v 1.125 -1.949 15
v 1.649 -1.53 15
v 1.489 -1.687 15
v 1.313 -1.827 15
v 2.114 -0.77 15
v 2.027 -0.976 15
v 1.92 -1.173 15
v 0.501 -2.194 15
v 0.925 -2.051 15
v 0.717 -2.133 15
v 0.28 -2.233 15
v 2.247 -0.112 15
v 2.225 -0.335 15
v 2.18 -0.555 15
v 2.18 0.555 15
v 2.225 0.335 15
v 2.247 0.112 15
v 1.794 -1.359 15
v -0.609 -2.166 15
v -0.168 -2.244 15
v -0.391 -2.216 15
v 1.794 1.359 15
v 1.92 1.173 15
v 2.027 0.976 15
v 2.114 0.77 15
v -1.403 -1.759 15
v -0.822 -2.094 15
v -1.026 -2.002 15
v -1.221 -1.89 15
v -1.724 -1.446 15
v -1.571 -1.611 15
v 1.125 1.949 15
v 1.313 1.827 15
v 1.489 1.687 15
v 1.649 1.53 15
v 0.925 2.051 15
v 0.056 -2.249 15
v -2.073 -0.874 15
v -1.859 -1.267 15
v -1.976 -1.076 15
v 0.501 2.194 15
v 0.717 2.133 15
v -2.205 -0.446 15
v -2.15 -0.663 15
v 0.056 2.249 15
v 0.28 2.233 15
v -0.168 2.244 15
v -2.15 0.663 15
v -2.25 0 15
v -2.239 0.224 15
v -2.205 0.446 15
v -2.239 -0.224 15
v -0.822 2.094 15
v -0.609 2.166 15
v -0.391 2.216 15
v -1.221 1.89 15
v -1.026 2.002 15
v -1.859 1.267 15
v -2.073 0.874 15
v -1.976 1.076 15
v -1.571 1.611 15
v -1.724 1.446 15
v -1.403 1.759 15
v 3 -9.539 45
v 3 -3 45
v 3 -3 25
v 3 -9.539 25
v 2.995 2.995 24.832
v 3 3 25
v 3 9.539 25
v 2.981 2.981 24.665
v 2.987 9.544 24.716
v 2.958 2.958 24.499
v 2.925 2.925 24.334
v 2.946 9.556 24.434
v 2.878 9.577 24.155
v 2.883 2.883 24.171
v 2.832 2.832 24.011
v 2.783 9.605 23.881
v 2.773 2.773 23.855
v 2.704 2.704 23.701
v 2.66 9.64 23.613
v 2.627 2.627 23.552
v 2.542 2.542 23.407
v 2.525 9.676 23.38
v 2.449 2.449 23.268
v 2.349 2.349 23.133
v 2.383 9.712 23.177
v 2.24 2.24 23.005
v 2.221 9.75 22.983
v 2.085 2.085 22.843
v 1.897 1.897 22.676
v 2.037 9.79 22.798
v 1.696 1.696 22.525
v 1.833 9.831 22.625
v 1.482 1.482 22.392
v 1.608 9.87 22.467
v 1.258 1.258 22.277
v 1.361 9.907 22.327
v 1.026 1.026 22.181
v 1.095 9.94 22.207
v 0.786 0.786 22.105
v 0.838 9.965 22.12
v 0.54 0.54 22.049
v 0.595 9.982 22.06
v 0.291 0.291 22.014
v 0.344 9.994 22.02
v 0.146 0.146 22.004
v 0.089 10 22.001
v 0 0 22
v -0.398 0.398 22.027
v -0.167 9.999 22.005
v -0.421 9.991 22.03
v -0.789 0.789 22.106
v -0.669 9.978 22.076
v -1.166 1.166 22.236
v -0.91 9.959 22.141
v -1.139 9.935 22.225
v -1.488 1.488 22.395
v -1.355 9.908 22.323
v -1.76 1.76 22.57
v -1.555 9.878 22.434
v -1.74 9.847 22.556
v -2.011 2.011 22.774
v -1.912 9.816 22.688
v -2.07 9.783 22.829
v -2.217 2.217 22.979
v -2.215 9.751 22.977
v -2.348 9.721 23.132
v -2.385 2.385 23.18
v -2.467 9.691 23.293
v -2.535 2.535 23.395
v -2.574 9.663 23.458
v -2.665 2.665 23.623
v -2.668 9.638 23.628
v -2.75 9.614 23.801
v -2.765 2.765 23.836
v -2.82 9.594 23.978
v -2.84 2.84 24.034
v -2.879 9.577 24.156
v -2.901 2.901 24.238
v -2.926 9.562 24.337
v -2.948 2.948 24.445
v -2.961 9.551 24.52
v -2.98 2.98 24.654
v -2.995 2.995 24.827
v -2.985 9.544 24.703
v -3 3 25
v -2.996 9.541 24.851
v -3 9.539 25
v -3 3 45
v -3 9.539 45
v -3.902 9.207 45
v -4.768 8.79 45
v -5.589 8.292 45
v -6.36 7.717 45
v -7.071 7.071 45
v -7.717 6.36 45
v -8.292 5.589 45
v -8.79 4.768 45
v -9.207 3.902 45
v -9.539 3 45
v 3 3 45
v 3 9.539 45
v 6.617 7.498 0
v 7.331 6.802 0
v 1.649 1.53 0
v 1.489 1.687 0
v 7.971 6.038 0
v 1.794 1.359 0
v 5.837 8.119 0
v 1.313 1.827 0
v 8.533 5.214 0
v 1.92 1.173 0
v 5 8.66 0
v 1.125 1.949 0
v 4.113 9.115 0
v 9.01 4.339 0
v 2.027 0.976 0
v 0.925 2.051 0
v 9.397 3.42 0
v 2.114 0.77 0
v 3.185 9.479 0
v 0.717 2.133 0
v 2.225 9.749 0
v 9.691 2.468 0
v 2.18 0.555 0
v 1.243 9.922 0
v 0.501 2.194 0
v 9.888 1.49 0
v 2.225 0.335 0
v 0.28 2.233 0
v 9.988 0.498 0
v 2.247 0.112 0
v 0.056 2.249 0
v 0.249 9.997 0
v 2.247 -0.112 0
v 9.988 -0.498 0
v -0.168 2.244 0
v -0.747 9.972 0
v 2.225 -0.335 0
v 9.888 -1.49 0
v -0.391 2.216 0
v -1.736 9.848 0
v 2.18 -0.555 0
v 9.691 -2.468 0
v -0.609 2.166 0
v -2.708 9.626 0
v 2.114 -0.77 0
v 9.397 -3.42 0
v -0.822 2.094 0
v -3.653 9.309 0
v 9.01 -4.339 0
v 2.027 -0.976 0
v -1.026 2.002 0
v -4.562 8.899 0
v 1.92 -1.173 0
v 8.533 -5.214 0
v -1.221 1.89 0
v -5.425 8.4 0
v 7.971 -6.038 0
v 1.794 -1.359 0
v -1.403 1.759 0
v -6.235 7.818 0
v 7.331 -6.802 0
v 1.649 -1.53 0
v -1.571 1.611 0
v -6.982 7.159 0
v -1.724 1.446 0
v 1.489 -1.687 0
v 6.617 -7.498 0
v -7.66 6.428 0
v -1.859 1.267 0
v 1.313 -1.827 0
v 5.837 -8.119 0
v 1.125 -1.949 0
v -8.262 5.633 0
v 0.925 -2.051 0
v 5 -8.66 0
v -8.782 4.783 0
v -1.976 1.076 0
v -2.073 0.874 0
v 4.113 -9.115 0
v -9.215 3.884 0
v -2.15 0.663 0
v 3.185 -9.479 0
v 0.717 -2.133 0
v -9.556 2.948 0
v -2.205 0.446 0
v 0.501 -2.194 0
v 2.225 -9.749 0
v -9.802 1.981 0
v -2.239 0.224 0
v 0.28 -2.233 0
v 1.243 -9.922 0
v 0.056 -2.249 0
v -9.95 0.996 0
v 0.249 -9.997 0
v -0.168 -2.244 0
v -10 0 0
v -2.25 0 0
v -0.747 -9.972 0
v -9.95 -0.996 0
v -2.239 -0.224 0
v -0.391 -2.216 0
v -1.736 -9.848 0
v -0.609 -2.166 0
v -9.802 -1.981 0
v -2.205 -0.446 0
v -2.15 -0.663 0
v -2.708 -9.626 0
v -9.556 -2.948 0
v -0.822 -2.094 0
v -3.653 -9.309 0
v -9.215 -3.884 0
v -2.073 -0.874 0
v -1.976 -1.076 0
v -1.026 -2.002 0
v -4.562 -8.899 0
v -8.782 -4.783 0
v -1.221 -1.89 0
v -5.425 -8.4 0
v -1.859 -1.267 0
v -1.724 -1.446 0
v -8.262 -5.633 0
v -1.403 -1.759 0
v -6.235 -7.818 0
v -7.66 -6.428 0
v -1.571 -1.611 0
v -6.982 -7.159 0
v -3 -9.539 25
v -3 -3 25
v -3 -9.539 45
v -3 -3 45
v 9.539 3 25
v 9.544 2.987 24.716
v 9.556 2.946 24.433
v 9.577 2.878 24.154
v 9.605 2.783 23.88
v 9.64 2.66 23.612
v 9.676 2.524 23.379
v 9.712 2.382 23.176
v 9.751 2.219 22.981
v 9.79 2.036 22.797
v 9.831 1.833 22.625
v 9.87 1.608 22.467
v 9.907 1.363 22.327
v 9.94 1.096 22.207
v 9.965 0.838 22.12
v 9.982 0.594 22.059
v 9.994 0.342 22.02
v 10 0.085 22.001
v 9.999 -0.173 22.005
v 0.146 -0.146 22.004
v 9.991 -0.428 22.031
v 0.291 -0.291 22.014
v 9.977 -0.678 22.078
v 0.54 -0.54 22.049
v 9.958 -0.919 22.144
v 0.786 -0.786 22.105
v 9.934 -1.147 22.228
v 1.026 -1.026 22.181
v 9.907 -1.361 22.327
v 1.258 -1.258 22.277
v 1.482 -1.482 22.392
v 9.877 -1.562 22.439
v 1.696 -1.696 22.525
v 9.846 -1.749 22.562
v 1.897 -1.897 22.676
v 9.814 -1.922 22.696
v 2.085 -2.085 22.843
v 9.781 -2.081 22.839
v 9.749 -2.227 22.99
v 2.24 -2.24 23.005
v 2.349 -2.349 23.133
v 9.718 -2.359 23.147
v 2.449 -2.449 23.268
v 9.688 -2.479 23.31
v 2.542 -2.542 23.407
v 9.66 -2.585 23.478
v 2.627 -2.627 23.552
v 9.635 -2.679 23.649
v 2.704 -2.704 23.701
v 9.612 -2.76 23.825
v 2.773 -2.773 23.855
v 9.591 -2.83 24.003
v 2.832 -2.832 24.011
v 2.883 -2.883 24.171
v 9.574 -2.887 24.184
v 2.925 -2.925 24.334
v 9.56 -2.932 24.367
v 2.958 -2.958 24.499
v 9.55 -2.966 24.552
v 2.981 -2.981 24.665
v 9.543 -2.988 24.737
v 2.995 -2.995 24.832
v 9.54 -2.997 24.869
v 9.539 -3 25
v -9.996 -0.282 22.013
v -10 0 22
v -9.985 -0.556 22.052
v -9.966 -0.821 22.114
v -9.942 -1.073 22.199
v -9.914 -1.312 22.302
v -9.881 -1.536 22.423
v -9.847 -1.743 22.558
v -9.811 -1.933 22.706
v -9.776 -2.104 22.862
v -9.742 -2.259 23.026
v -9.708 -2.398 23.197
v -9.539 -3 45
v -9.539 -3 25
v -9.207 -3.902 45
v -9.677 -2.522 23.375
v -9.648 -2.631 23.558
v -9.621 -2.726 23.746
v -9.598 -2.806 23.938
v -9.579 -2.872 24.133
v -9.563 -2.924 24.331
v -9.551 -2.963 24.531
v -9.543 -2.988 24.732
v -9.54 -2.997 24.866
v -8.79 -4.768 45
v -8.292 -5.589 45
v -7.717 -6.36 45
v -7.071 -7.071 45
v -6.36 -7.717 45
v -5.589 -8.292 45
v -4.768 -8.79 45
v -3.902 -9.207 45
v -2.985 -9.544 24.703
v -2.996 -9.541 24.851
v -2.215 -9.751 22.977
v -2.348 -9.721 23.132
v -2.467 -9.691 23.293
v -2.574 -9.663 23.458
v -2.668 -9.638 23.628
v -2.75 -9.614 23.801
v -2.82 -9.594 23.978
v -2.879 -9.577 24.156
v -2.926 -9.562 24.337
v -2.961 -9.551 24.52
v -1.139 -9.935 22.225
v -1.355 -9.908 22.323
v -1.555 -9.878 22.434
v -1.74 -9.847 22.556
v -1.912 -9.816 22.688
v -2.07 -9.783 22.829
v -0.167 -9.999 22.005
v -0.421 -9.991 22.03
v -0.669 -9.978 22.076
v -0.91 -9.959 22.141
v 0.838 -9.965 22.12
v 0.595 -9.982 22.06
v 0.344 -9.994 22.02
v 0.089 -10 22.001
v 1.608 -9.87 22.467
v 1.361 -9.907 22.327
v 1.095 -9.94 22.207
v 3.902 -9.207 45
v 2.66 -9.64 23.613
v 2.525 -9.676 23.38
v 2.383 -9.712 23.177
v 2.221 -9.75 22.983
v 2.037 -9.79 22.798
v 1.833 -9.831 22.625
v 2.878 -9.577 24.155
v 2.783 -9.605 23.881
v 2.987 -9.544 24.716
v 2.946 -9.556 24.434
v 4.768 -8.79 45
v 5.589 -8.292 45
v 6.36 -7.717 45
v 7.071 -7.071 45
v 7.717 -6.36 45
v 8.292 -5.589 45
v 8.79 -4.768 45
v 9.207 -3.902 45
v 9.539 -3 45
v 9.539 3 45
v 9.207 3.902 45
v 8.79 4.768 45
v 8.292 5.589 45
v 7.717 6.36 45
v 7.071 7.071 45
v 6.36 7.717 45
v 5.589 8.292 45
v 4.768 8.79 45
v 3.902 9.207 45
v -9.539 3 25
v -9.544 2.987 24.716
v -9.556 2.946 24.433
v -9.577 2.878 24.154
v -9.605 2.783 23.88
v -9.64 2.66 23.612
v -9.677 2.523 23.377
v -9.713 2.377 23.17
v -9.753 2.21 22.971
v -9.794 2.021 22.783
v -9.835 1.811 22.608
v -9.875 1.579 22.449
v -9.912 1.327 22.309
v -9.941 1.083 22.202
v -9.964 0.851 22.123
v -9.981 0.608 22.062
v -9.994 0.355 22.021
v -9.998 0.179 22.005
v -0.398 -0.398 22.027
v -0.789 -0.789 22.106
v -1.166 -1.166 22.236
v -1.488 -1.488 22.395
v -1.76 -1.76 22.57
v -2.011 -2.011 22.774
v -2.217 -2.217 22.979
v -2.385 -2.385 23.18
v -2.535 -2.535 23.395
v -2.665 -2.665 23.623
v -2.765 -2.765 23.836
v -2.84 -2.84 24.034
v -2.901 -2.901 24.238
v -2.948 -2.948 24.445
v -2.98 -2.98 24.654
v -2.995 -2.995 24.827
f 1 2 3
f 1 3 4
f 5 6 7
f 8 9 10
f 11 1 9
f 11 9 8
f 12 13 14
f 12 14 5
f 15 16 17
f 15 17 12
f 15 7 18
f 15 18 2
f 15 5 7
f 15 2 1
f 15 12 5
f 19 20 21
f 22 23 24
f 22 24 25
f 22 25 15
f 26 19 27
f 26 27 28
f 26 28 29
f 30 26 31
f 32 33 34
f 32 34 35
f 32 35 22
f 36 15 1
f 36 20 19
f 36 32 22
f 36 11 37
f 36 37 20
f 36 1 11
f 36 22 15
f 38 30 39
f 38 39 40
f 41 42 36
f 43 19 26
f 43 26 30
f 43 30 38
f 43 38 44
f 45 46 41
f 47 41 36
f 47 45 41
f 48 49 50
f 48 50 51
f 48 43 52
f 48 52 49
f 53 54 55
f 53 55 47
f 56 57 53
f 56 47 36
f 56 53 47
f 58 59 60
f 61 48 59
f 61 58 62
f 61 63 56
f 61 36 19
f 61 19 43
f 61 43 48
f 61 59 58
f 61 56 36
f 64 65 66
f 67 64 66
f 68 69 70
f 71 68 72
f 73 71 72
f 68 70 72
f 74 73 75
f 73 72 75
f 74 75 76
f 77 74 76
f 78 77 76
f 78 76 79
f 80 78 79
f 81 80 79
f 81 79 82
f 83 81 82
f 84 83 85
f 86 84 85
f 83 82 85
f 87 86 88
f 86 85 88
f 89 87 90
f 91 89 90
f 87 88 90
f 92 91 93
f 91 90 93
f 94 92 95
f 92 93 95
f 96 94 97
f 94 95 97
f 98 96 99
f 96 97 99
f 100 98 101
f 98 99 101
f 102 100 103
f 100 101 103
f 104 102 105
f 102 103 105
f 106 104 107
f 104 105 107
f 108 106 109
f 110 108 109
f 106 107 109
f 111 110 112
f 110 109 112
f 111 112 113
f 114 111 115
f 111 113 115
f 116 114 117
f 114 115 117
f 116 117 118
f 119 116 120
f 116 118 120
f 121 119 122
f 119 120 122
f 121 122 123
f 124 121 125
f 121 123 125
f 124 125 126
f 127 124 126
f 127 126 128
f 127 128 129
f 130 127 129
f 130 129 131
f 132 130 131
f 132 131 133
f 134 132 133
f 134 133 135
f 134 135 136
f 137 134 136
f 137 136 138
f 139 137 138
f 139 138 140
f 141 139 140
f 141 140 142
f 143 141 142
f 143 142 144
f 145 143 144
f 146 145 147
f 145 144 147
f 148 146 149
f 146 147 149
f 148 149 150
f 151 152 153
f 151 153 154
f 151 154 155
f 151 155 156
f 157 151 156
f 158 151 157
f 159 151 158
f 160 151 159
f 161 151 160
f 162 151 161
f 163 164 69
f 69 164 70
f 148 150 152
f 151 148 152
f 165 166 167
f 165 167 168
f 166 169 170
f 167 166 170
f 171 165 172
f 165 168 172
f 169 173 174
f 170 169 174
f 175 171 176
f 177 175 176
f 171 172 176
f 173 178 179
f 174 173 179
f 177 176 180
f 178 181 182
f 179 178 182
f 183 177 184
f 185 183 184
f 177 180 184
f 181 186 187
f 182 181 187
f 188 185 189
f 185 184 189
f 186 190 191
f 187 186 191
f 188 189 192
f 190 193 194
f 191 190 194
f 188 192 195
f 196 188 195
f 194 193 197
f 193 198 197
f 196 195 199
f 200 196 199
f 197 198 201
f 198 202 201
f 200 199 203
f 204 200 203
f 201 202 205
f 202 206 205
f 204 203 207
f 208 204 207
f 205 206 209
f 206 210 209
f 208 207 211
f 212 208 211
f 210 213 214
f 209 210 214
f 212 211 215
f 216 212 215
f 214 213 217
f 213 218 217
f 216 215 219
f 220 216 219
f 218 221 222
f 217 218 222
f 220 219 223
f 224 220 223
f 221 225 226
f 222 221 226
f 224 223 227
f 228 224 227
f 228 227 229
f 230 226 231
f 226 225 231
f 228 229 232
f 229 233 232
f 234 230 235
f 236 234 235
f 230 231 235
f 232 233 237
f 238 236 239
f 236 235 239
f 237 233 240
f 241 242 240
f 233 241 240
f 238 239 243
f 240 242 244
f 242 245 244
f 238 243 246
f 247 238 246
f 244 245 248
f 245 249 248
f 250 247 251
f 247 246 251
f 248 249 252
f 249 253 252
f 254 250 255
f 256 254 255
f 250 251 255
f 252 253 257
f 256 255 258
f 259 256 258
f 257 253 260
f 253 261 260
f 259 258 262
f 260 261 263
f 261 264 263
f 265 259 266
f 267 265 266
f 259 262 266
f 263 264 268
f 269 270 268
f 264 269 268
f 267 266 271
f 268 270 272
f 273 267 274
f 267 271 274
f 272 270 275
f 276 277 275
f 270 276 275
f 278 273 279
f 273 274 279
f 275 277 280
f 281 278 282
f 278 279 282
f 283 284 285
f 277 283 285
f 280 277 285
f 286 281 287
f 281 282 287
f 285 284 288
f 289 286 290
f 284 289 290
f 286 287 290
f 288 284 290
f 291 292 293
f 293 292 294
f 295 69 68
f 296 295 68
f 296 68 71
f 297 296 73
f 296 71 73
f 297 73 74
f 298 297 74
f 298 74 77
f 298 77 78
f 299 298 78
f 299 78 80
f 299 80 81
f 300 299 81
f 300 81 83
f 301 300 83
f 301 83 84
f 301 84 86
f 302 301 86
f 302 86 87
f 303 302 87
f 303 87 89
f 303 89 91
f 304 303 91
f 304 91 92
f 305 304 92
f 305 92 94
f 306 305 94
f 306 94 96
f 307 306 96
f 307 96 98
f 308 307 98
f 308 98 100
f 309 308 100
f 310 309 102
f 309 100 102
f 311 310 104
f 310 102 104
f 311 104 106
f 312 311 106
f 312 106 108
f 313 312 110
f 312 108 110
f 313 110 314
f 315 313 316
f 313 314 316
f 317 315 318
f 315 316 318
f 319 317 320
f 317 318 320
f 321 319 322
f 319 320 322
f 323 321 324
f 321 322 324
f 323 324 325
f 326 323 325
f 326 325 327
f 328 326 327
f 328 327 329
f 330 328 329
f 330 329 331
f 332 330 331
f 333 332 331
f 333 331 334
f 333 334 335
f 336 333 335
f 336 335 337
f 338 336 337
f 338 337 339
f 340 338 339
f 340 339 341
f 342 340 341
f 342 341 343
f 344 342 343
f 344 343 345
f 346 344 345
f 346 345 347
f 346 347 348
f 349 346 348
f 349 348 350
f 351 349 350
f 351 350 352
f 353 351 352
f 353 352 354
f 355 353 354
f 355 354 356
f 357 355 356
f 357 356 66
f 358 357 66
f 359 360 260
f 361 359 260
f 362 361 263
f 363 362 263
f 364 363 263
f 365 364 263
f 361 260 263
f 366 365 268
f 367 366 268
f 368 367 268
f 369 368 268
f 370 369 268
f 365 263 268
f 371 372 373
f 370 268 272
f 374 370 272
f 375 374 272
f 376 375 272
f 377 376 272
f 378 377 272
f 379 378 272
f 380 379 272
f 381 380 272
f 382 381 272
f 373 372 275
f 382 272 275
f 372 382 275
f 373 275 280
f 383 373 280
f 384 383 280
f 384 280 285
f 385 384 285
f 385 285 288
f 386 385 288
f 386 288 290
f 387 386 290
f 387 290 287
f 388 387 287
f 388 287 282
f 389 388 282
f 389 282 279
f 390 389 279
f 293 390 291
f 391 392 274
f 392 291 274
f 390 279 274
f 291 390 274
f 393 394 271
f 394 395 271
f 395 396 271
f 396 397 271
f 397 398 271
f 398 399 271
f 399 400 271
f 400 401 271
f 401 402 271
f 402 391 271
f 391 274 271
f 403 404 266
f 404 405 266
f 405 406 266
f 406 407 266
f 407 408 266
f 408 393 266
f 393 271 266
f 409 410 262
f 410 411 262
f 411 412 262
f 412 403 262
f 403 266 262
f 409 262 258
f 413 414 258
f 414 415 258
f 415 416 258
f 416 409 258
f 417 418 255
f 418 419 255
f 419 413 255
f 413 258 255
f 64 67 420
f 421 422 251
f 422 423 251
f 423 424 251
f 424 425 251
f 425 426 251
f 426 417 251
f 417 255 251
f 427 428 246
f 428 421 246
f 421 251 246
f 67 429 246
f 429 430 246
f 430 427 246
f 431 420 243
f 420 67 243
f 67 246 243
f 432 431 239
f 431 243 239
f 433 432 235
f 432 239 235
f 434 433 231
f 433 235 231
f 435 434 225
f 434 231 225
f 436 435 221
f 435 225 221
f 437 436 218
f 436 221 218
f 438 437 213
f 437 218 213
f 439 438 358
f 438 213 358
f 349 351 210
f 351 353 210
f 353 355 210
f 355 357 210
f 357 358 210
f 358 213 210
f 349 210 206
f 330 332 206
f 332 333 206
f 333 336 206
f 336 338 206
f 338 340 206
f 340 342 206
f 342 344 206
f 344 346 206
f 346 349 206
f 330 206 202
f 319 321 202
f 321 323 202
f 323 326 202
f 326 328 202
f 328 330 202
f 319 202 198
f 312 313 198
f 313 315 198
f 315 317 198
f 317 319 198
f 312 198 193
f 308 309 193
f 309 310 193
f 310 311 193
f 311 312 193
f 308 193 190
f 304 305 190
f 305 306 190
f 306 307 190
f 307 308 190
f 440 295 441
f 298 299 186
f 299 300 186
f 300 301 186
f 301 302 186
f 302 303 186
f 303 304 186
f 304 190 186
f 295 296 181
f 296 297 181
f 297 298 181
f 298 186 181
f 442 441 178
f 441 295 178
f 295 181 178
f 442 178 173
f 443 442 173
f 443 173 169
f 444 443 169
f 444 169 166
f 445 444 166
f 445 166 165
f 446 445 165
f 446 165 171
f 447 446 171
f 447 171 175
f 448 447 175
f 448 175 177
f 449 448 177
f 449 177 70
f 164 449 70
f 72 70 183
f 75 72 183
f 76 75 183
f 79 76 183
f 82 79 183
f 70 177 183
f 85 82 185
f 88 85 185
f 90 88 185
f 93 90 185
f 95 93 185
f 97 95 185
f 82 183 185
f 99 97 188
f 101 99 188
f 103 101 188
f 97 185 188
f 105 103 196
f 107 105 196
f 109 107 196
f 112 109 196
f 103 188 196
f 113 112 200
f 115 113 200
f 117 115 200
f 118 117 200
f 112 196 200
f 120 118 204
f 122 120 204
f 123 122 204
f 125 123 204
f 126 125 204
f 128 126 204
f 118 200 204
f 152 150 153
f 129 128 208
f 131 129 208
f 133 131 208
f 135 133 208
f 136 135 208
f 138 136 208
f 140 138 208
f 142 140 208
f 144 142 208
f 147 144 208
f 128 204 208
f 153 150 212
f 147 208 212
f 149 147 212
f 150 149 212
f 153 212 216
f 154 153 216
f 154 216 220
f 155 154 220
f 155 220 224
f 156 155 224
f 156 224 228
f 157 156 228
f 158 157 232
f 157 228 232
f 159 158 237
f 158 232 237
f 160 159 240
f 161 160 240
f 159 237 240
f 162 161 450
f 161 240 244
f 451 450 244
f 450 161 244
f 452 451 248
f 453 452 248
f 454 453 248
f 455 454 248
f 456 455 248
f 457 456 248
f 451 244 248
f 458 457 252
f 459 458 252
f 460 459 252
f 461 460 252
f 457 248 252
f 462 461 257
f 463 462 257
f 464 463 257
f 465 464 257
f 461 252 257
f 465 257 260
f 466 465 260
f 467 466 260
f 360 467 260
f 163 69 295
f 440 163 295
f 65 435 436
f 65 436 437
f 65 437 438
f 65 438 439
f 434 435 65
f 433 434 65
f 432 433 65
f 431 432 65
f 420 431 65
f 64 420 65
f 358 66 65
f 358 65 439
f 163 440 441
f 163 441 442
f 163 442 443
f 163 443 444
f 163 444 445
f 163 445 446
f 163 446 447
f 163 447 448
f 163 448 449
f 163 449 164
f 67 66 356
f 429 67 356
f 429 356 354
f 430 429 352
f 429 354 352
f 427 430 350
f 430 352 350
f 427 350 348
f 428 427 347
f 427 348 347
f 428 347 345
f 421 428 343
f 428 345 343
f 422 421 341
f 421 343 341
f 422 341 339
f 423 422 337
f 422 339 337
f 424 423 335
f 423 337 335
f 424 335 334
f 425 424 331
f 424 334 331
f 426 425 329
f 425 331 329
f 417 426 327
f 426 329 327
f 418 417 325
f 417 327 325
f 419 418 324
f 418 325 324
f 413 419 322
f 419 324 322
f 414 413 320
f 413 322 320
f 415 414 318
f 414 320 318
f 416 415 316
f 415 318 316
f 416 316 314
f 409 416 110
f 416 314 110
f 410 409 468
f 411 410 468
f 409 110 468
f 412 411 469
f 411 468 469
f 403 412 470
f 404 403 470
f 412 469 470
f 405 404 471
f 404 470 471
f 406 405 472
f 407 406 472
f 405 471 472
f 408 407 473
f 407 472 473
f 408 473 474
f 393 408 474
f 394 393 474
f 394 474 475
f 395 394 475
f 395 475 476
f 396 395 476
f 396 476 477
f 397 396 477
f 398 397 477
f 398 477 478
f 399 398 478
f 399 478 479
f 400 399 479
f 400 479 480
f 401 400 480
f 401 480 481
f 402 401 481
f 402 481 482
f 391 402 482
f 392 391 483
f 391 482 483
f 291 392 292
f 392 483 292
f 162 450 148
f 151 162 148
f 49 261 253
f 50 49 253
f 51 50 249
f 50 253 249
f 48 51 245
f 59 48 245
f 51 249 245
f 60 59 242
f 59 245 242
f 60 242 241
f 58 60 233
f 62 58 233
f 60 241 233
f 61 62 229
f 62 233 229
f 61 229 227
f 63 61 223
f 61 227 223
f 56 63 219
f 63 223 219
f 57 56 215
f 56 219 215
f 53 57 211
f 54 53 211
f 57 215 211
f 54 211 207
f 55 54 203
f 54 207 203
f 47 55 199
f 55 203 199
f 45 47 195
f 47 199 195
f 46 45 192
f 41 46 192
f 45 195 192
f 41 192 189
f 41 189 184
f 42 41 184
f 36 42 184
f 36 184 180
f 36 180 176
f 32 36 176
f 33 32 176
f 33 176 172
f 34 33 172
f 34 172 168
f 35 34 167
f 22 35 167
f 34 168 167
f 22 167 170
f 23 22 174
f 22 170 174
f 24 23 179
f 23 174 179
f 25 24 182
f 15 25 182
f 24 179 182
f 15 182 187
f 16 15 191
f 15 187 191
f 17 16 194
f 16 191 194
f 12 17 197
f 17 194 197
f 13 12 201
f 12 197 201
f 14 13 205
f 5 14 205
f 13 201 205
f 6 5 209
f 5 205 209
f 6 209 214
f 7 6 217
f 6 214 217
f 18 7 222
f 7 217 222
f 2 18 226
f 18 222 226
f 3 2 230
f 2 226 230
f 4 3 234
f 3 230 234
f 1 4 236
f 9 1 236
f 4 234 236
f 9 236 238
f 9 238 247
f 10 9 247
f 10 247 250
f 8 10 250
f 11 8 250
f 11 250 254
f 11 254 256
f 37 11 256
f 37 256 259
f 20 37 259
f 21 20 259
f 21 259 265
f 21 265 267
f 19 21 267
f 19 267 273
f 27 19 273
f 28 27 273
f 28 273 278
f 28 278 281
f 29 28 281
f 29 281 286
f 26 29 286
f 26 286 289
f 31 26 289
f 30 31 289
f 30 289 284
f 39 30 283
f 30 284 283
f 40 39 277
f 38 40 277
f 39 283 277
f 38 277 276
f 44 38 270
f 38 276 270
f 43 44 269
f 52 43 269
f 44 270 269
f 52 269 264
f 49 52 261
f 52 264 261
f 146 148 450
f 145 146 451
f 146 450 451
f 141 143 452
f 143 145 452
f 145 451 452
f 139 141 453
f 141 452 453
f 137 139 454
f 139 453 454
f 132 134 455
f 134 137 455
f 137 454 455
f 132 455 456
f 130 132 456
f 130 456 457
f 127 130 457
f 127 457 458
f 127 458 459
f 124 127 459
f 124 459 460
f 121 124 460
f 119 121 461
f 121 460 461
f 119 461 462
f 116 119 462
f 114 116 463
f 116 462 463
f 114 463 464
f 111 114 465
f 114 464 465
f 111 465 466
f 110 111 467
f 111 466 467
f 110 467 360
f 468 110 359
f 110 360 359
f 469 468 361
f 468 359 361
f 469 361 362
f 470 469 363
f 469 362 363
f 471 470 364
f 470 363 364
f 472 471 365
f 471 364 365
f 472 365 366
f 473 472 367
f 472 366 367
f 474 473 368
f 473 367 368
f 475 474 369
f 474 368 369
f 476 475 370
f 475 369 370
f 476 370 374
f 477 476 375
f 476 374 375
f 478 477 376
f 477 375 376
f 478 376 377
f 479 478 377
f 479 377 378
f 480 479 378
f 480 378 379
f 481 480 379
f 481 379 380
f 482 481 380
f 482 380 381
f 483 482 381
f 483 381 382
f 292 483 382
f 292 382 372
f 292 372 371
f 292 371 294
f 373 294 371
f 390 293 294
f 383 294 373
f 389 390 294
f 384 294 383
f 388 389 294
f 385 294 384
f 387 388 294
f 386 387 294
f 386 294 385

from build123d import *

# Parameters (mm, degrees)
SKETCH_1_R          = 10
EXTRUDE_1_DEPTH     = 45
CUT_EXTRUDE_1_DEPTH = 22.5
SKETCH_4_W          = 29.063503474
SKETCH_4_H          = 6
CUT_EXTRUDE_2_DEPTH = 20
SKETCH_5_R          = 2.25
CUT_EXTRUDE_3_DEPTH = 15
SKETCH_6_R          = 3
CUT_EXTRUDE_4_DEPTH = 23


with BuildPart() as part:
    # 草图1 → 凸台-拉伸1 (new body)
    with BuildSketch(Plane.XY):
        with Locations(Location((0, 0, 0), (0, 0, 180))):
            Circle(SKETCH_1_R)
    extrude(amount=EXTRUDE_1_DEPTH)

    # 草图2 → 切除-拉伸1 (cut, symmetric)
    with BuildSketch(Plane(origin=(0, 0, 0), x_dir=(1, 0, 0), z_dir=(0, 1, 0))):
        with BuildLine():
            Line((3, -45), (3, -25))
            ThreePointArc((3, -25), (0, -22), (-3, -25))
            Line((-3, -25), (-3, -45))
            Line((-3, -45), (3, -45))
        make_face()
    extrude(amount=CUT_EXTRUDE_1_DEPTH, both=True, mode=Mode.SUBTRACT)

    # 草图4 → 切除-拉伸2 (cut)
    with BuildSketch(Plane.XY.offset(45)):
        Rectangle(SKETCH_4_W, SKETCH_4_H)
    extrude(amount=-CUT_EXTRUDE_2_DEPTH, mode=Mode.SUBTRACT)

    # 草图5 → 切除-拉伸3 (cut)
    with BuildSketch(Plane(origin=(0, 0, 0), x_dir=(-1, 0, 0), z_dir=(0, 0, -1))):
        Circle(SKETCH_5_R)
    extrude(amount=-CUT_EXTRUDE_3_DEPTH, mode=Mode.SUBTRACT)

    # 草图6 → 切除-拉伸4 (cut, symmetric)
    with BuildSketch(Plane.ZY):
        with Locations((25, 0)):
            Circle(SKETCH_6_R)
    extrude(amount=CUT_EXTRUDE_4_DEPTH, both=True, mode=Mode.SUBTRACT)


solid = part.part
